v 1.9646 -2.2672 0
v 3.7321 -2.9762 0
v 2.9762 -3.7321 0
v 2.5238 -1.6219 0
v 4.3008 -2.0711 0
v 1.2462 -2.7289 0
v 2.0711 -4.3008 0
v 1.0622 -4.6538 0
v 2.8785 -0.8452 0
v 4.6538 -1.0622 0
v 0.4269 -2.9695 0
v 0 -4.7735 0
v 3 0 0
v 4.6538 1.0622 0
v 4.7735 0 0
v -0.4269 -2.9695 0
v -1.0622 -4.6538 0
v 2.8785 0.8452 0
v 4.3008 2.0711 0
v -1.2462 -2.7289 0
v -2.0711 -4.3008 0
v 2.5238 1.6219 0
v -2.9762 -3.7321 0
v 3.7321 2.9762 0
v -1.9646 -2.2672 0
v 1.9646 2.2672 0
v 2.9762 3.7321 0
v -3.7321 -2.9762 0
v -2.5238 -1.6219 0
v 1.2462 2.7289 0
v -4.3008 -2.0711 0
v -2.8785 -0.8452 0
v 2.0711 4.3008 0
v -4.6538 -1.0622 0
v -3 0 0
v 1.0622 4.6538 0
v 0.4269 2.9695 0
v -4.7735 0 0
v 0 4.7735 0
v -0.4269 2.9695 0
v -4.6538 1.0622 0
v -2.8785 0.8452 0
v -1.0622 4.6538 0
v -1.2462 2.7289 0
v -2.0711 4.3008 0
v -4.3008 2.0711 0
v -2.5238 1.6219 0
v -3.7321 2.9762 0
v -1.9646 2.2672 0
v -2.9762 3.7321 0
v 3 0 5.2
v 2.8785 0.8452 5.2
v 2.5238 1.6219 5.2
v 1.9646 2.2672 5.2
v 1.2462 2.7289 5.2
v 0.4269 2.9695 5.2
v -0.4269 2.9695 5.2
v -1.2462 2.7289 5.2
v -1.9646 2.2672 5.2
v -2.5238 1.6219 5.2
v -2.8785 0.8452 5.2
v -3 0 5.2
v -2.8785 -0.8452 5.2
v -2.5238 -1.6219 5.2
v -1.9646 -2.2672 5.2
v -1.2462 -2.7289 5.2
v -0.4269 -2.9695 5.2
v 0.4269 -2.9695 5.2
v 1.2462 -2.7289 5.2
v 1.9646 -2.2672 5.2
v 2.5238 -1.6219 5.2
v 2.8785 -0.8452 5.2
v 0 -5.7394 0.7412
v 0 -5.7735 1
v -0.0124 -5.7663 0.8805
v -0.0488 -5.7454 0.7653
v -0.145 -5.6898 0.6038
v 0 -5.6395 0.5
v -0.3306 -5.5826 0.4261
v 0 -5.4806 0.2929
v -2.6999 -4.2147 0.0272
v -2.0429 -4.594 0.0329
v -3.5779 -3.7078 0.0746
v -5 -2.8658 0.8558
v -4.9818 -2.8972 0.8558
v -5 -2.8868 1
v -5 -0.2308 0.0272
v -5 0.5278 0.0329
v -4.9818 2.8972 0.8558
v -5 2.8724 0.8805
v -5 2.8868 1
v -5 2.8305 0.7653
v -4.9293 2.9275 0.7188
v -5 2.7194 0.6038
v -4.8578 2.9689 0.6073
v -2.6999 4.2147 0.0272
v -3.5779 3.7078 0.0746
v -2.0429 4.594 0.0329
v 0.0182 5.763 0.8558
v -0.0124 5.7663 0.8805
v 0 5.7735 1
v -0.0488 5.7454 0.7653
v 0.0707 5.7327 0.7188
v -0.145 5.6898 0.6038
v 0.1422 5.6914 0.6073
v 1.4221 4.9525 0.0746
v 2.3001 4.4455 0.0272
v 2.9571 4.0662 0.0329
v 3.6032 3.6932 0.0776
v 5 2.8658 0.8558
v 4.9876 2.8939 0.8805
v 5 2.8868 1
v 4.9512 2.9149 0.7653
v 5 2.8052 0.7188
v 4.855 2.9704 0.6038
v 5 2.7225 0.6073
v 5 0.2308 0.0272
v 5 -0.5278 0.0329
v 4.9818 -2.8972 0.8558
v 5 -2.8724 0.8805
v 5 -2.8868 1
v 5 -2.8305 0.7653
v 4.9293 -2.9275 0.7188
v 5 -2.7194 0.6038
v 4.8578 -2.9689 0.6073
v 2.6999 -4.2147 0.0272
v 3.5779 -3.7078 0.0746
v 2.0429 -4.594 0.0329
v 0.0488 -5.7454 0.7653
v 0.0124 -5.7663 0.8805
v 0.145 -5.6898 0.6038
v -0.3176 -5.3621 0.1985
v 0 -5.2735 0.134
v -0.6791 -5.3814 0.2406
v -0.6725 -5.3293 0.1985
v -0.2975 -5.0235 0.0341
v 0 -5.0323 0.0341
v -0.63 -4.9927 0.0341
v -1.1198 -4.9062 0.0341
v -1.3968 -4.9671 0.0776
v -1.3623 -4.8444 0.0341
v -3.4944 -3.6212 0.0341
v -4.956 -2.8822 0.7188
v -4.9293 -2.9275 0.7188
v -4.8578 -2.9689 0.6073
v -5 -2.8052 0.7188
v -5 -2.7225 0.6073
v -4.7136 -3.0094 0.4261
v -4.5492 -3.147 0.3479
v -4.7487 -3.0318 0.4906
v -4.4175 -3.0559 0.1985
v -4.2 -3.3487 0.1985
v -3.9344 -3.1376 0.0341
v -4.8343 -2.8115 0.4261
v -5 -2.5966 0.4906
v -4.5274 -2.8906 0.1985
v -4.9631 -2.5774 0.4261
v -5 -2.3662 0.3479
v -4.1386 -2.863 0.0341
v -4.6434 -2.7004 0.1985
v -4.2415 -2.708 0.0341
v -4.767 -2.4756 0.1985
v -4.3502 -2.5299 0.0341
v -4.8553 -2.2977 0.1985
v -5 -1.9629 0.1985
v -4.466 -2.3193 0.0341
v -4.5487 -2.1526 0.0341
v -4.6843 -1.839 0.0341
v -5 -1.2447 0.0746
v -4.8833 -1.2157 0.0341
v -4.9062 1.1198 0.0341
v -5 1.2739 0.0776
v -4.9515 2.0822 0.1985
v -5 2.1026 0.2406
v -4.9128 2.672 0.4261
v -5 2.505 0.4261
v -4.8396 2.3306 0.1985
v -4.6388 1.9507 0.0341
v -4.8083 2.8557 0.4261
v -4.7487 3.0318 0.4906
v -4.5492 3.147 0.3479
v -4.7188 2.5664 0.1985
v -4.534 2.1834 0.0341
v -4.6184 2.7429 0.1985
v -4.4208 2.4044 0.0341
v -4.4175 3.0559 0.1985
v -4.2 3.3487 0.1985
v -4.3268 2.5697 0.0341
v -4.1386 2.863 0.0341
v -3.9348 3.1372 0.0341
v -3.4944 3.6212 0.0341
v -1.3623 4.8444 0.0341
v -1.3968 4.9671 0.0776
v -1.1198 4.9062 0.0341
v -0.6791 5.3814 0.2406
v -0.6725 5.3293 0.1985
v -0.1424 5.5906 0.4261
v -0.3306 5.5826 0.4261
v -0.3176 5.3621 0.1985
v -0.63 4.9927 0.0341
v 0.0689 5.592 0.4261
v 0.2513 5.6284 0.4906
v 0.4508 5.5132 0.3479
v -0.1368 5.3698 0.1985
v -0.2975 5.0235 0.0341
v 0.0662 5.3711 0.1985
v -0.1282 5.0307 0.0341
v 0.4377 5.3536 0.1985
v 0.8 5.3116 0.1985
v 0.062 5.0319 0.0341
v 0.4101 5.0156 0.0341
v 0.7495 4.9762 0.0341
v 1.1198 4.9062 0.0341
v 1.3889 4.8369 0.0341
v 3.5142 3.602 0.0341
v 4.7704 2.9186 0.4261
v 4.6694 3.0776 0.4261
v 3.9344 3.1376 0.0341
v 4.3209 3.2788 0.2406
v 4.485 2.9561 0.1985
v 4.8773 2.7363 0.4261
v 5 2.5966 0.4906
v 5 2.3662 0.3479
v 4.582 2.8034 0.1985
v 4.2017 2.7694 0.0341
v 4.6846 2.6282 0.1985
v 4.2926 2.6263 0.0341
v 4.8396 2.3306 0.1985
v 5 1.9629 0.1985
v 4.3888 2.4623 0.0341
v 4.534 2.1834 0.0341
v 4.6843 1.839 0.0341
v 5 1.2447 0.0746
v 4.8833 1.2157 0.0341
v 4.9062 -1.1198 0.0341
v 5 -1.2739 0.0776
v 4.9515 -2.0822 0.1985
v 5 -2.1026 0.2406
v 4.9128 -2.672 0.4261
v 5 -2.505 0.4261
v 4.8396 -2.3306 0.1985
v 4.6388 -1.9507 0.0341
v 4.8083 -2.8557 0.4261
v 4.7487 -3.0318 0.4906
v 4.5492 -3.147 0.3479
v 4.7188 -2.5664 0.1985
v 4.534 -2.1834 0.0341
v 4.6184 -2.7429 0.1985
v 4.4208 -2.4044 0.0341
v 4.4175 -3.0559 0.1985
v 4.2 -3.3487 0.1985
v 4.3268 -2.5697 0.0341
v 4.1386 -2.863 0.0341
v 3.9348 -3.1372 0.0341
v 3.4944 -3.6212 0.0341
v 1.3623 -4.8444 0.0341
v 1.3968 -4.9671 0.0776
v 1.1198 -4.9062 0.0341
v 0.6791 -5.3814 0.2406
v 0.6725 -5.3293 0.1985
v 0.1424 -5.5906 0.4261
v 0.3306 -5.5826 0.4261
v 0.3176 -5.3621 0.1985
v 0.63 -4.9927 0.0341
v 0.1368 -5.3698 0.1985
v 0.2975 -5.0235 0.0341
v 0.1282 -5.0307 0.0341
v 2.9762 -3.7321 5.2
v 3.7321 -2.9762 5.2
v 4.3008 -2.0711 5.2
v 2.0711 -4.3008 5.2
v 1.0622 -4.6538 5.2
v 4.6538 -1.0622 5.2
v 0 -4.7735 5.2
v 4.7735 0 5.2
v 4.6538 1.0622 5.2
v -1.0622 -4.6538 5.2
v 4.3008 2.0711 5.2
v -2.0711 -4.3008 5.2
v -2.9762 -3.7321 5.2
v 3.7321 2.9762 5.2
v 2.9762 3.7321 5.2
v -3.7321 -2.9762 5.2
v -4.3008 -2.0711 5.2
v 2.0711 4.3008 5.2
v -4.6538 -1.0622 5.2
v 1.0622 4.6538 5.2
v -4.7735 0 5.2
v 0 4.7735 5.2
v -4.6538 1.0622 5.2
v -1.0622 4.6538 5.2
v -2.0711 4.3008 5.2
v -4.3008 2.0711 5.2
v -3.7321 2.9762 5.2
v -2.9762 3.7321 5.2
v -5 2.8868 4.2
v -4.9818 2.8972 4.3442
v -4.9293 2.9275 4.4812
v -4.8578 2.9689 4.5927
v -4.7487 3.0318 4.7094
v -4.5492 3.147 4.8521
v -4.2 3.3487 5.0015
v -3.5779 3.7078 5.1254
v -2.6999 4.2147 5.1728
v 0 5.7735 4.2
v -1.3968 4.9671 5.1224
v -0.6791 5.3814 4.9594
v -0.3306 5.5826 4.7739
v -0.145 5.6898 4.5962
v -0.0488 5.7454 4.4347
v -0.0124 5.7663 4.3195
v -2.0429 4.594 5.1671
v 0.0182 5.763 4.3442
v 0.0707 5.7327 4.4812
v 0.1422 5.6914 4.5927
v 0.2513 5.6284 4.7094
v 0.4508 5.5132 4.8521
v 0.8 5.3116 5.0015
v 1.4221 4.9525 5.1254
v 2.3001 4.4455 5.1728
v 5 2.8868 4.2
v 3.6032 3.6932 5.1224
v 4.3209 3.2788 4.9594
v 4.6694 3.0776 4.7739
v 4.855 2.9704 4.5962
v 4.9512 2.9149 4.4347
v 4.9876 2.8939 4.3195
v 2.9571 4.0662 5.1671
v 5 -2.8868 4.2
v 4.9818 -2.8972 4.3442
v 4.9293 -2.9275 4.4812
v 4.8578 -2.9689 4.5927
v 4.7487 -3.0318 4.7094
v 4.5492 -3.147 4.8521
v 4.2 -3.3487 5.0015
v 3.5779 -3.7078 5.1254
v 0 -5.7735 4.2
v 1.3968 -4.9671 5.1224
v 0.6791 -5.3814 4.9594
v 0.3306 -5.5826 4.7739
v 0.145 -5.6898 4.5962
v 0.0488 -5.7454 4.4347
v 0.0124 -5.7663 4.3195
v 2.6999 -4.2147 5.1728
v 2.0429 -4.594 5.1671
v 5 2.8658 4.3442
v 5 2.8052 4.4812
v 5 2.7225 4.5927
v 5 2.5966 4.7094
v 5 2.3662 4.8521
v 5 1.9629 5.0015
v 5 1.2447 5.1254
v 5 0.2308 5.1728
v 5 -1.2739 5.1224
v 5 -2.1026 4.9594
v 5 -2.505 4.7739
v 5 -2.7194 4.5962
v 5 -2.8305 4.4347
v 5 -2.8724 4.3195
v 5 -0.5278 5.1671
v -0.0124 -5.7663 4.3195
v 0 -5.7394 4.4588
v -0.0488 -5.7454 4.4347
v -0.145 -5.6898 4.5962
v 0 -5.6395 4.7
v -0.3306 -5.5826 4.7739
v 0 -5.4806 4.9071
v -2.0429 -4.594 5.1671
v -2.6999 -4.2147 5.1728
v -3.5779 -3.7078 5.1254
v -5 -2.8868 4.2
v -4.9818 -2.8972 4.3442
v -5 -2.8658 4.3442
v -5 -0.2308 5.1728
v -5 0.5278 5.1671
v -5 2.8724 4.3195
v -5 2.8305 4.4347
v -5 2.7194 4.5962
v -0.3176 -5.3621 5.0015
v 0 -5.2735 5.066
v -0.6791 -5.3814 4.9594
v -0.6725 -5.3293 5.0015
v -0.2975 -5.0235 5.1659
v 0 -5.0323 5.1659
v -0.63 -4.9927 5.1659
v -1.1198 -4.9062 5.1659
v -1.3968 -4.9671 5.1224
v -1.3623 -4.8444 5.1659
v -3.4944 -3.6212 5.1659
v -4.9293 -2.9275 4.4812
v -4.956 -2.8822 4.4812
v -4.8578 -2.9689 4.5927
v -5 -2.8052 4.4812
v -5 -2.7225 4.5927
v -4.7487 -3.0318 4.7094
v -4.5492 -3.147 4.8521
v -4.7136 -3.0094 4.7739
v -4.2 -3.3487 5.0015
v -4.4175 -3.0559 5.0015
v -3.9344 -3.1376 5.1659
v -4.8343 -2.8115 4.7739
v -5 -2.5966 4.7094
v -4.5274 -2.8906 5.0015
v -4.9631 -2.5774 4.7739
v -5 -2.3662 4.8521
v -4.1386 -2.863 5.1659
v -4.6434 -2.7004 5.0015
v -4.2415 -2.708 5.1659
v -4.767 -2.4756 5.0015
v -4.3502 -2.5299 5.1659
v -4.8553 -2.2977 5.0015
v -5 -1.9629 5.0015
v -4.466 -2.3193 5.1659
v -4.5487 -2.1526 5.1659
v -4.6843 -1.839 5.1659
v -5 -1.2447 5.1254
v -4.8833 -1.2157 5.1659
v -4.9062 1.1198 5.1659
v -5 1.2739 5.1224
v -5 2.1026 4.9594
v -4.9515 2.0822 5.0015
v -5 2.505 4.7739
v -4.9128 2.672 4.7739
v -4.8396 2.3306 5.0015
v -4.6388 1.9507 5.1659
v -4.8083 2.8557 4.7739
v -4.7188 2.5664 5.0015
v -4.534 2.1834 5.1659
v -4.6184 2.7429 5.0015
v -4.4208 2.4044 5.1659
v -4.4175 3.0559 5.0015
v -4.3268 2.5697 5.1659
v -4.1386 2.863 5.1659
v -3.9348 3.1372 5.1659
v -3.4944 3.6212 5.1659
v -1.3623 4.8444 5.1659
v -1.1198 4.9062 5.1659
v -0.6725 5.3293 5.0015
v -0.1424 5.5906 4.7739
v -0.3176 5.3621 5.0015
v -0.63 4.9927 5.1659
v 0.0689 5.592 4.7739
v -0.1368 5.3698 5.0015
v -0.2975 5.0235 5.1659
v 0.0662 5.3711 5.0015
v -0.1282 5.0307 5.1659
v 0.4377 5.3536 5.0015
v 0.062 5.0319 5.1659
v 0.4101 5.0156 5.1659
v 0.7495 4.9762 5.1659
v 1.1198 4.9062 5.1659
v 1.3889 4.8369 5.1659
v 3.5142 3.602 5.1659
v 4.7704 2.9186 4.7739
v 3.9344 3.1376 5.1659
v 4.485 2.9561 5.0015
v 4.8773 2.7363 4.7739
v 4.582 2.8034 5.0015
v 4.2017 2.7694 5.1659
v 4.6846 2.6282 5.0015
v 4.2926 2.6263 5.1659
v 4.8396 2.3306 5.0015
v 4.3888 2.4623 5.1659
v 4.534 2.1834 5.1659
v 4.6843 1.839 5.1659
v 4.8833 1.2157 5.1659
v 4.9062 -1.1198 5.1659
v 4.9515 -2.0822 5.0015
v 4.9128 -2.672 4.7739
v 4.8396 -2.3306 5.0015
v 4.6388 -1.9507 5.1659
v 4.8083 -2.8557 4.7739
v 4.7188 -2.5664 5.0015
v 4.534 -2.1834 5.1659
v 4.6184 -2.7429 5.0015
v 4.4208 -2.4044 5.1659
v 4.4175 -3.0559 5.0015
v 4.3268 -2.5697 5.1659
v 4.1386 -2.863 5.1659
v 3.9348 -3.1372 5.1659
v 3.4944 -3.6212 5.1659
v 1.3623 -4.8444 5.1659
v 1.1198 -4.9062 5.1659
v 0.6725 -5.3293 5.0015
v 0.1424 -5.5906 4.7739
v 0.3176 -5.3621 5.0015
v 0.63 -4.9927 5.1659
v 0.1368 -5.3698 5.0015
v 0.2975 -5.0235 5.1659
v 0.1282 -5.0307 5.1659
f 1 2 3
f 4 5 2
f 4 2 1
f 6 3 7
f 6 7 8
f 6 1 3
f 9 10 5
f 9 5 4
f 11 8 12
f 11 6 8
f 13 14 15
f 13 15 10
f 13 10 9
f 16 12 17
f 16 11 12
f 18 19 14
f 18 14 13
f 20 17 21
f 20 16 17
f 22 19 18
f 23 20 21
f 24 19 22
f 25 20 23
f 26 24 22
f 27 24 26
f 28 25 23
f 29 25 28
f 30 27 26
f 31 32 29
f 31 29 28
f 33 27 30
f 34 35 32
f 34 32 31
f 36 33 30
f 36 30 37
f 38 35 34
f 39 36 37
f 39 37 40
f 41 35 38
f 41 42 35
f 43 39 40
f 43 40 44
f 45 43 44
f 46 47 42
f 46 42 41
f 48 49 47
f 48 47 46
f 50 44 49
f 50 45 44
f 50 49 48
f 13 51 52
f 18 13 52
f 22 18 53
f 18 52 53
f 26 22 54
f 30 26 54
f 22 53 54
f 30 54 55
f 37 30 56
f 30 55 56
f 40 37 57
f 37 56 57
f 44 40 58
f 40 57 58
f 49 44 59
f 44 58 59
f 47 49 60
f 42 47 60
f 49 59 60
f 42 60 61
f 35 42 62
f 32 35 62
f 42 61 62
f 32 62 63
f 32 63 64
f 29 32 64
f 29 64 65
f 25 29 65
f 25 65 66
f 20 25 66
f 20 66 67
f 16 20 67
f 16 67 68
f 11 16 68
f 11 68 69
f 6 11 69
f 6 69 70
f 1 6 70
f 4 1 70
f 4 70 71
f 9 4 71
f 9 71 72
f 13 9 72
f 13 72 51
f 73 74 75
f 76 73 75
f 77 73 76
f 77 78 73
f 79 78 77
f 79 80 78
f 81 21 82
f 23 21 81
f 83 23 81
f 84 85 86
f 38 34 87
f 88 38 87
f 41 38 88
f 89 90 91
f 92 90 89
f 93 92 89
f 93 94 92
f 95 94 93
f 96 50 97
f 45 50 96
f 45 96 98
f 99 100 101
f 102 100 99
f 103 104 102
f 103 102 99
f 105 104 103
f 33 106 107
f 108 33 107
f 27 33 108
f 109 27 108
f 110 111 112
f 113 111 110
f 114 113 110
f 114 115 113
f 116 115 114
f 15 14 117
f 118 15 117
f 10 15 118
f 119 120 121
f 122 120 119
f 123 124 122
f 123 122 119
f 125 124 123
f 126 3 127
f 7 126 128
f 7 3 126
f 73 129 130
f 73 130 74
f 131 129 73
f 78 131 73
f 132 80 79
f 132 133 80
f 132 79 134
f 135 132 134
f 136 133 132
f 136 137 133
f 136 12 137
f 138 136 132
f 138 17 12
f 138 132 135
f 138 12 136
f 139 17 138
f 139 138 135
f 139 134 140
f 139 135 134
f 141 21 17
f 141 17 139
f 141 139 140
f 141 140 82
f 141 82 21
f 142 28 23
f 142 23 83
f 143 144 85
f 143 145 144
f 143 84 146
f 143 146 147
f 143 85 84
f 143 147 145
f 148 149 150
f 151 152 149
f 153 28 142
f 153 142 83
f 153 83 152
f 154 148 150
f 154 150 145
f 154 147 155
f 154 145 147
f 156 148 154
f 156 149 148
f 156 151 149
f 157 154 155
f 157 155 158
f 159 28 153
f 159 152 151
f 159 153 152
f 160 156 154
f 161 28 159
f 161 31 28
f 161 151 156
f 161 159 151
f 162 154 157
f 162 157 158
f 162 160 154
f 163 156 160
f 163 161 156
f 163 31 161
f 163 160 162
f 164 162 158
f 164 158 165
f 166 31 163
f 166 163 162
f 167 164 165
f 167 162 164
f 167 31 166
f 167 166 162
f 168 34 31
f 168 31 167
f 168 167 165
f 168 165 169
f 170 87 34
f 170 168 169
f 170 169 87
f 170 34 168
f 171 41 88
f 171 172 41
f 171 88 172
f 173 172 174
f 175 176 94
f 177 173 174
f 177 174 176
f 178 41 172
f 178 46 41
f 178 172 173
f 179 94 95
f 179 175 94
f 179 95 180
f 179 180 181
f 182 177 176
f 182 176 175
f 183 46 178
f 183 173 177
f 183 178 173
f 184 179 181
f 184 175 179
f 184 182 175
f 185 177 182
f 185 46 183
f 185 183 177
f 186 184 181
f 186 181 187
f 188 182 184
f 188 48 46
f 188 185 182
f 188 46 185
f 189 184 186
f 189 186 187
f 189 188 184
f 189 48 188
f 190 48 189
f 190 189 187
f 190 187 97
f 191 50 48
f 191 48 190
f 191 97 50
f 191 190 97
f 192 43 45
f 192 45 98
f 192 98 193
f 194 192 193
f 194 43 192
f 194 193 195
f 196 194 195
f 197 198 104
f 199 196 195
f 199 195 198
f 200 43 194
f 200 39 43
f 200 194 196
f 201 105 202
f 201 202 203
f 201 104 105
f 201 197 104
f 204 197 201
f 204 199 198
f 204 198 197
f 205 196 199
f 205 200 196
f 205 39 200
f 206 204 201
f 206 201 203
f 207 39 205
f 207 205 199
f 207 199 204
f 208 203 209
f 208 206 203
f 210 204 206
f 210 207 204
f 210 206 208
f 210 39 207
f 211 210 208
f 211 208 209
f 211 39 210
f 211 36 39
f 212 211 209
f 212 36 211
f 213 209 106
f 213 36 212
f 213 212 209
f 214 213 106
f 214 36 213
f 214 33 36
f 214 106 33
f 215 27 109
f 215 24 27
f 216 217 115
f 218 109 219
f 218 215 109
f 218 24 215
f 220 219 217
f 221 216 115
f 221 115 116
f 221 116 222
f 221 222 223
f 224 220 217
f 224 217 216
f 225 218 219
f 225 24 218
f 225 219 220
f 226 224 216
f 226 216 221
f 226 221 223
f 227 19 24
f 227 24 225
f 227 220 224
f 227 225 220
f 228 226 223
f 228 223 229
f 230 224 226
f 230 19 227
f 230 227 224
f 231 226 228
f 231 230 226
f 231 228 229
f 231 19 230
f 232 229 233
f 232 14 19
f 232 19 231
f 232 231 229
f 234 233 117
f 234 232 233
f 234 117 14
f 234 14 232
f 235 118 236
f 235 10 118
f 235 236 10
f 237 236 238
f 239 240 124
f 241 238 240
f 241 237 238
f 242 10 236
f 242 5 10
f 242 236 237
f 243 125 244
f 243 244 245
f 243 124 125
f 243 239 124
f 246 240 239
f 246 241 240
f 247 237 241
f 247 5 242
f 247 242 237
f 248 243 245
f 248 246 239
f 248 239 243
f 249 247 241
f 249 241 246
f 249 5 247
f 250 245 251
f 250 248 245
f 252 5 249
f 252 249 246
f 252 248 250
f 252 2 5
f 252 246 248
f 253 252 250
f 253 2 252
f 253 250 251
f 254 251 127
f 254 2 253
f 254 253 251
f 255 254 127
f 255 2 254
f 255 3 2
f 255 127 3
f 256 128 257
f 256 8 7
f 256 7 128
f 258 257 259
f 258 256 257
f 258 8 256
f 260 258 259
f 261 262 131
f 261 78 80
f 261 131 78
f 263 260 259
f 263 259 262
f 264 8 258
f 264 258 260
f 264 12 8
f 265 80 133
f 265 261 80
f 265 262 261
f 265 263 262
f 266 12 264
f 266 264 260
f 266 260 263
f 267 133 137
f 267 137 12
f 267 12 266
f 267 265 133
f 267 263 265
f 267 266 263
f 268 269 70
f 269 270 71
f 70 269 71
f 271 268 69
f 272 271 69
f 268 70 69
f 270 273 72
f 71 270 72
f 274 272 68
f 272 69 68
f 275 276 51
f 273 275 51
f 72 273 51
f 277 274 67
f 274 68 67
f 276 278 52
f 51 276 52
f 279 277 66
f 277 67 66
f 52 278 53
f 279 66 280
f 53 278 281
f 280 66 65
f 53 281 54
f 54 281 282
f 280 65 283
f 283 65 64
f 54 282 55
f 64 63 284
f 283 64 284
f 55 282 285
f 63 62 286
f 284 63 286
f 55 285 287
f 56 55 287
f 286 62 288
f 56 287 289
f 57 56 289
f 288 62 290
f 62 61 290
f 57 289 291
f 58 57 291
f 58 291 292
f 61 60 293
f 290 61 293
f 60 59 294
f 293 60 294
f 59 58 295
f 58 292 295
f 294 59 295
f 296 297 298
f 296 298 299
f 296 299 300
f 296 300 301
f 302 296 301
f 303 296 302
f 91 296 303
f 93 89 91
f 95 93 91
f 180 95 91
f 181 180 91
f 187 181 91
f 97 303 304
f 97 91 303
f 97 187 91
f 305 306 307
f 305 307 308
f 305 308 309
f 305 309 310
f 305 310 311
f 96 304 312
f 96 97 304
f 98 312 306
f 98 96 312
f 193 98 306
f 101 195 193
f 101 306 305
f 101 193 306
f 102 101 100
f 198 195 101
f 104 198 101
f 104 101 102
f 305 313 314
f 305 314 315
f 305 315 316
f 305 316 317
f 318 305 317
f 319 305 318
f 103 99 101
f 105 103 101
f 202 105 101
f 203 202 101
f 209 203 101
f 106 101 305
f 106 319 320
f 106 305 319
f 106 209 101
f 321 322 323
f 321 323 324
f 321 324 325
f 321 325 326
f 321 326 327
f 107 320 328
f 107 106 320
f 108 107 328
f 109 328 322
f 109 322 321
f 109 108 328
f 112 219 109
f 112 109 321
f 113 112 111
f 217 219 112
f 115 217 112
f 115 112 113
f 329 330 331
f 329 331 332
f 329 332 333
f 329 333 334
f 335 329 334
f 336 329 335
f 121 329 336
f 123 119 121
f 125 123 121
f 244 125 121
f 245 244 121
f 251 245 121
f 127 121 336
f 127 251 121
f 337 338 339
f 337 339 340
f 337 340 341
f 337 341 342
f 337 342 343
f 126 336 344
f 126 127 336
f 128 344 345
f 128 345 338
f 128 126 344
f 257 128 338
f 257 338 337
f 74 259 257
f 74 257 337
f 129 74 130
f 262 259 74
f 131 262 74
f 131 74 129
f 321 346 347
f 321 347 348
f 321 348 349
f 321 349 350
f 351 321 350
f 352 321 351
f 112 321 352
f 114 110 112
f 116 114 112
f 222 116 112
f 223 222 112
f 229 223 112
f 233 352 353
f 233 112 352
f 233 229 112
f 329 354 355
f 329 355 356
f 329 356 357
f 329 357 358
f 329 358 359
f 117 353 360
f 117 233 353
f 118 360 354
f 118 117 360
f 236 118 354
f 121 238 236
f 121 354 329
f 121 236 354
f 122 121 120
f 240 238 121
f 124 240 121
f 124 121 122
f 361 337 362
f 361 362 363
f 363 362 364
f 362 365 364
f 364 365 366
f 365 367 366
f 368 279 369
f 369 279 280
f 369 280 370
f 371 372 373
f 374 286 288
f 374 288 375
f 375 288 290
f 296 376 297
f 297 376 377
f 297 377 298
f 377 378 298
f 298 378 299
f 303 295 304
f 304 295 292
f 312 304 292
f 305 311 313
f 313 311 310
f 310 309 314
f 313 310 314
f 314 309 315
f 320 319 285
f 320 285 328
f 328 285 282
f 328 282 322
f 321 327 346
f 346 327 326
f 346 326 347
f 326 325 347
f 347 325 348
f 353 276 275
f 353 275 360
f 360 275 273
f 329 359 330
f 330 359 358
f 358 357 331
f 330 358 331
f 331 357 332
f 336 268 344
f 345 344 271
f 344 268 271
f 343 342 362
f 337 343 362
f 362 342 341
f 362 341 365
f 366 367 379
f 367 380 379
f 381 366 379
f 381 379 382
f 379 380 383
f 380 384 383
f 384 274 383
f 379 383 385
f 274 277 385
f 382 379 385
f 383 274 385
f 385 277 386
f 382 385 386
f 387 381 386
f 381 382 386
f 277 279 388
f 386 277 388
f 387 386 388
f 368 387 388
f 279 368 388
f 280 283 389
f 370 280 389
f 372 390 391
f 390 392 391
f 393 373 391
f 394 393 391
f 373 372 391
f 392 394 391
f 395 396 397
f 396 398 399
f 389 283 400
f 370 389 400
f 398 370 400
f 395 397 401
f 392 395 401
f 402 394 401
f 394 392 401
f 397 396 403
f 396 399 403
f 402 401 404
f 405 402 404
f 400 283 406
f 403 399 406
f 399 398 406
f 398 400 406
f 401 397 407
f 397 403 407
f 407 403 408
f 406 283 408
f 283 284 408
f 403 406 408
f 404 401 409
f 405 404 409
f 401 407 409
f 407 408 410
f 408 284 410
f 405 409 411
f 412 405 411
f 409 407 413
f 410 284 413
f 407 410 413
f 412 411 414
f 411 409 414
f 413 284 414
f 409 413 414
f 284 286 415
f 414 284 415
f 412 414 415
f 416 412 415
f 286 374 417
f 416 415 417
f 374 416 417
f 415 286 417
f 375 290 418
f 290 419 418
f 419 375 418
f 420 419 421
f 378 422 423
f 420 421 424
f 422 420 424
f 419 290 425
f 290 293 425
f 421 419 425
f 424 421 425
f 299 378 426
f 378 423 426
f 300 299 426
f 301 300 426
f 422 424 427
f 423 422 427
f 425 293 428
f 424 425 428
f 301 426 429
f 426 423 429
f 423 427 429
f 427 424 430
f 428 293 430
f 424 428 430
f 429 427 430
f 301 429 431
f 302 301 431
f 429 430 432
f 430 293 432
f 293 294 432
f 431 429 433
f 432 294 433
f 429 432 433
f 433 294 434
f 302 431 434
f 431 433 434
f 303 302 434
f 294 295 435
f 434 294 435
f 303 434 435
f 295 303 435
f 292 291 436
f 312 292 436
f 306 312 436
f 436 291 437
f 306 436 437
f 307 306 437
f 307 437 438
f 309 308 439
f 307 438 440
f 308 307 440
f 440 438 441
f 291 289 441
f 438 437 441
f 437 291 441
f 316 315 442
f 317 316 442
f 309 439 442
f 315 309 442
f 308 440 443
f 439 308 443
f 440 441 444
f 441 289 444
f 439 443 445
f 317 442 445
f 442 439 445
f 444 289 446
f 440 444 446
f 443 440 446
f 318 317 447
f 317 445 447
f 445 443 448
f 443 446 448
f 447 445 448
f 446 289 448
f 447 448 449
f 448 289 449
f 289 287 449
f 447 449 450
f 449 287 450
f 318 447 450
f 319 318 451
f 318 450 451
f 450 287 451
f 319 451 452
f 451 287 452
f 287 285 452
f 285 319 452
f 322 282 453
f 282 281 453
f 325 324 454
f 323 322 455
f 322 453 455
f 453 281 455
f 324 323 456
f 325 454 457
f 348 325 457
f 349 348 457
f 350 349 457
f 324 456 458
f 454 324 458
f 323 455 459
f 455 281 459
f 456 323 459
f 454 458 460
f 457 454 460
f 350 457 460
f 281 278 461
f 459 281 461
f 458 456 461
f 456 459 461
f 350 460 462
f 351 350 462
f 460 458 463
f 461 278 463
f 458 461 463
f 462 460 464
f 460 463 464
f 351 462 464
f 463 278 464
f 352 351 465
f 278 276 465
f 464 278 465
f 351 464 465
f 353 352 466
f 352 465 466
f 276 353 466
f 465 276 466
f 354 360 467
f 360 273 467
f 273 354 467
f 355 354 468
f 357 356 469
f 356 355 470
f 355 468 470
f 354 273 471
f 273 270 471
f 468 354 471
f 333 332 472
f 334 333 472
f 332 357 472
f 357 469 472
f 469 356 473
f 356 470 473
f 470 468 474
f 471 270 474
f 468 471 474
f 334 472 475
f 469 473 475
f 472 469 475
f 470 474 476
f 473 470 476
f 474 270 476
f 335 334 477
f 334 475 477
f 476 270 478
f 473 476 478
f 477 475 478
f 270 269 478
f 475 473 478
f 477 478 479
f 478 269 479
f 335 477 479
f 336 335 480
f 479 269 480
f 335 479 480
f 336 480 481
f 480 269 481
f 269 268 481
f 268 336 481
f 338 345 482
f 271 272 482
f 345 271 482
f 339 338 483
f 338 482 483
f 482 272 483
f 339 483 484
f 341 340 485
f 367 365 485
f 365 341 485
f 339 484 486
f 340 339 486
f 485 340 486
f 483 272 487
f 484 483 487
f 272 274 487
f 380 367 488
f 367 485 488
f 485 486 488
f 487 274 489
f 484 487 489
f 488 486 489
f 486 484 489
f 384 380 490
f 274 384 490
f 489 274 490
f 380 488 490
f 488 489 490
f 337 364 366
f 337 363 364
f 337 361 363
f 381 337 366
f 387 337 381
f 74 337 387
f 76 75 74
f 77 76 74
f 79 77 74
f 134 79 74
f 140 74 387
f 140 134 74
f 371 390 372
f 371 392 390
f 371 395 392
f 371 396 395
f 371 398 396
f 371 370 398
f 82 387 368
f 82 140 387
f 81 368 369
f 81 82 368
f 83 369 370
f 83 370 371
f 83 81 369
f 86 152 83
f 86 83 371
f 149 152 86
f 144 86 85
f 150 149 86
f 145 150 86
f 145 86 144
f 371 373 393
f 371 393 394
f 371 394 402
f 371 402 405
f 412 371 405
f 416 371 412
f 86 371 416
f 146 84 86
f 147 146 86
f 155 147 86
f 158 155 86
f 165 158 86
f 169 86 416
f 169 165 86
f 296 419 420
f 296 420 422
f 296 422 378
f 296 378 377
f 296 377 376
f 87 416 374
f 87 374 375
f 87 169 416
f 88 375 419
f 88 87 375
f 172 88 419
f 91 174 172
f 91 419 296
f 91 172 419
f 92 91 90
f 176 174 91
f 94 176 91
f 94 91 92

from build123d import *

# Parameters (mm, degrees)
HEAD_DEPTH         = 5.2
HOLE_SKETCH_R      = 3
THROUGH_HOLE_DEPTH = 6.2000001


with BuildPart() as part:
    # Head Sketch → Head (new body)
    with BuildSketch(Plane.XY):
        Polygon((0, 5.773502692), (5, 2.886751346), (5, -2.886751346), (0, -5.773502692), (-5, -2.886751346), (-5, 2.886751346), align=None)
    extrude(amount=HEAD_DEPTH)

    # Sketch5 → Head Trim (revolve, cut)
    with BuildSketch(Plane(origin=(0, 0, 0), x_dir=(0, 0, -1), z_dir=(1, 0, 0))):
        with BuildLine():
            Line((-5.2, -4.773502692), (-5.2, -5.773502692))
            Line((-5.2, -5.773502692), (-4.2, -5.773502692))
            ThreePointArc((-4.2, -5.773502692), (-4.907106781, -5.480609473), (-5.2, -4.773502692))
        make_face()
    head_trim = revolve(axis=Axis((0, 0, 15.085599173), (0, 0, -1)), mode=Mode.SUBTRACT)

    # Hole Sketch → Through Hole (cut, through all)
    with BuildSketch(Plane.XY.offset(5.2)):
        Circle(HOLE_SKETCH_R)
    extrude(amount=-THROUGH_HOLE_DEPTH, mode=Mode.SUBTRACT)

    # Symétrie2: Head Trim across plane
    add(head_trim.mirror(Plane.XY.offset(2.6)), mode=Mode.SUBTRACT)


solid = part.part
